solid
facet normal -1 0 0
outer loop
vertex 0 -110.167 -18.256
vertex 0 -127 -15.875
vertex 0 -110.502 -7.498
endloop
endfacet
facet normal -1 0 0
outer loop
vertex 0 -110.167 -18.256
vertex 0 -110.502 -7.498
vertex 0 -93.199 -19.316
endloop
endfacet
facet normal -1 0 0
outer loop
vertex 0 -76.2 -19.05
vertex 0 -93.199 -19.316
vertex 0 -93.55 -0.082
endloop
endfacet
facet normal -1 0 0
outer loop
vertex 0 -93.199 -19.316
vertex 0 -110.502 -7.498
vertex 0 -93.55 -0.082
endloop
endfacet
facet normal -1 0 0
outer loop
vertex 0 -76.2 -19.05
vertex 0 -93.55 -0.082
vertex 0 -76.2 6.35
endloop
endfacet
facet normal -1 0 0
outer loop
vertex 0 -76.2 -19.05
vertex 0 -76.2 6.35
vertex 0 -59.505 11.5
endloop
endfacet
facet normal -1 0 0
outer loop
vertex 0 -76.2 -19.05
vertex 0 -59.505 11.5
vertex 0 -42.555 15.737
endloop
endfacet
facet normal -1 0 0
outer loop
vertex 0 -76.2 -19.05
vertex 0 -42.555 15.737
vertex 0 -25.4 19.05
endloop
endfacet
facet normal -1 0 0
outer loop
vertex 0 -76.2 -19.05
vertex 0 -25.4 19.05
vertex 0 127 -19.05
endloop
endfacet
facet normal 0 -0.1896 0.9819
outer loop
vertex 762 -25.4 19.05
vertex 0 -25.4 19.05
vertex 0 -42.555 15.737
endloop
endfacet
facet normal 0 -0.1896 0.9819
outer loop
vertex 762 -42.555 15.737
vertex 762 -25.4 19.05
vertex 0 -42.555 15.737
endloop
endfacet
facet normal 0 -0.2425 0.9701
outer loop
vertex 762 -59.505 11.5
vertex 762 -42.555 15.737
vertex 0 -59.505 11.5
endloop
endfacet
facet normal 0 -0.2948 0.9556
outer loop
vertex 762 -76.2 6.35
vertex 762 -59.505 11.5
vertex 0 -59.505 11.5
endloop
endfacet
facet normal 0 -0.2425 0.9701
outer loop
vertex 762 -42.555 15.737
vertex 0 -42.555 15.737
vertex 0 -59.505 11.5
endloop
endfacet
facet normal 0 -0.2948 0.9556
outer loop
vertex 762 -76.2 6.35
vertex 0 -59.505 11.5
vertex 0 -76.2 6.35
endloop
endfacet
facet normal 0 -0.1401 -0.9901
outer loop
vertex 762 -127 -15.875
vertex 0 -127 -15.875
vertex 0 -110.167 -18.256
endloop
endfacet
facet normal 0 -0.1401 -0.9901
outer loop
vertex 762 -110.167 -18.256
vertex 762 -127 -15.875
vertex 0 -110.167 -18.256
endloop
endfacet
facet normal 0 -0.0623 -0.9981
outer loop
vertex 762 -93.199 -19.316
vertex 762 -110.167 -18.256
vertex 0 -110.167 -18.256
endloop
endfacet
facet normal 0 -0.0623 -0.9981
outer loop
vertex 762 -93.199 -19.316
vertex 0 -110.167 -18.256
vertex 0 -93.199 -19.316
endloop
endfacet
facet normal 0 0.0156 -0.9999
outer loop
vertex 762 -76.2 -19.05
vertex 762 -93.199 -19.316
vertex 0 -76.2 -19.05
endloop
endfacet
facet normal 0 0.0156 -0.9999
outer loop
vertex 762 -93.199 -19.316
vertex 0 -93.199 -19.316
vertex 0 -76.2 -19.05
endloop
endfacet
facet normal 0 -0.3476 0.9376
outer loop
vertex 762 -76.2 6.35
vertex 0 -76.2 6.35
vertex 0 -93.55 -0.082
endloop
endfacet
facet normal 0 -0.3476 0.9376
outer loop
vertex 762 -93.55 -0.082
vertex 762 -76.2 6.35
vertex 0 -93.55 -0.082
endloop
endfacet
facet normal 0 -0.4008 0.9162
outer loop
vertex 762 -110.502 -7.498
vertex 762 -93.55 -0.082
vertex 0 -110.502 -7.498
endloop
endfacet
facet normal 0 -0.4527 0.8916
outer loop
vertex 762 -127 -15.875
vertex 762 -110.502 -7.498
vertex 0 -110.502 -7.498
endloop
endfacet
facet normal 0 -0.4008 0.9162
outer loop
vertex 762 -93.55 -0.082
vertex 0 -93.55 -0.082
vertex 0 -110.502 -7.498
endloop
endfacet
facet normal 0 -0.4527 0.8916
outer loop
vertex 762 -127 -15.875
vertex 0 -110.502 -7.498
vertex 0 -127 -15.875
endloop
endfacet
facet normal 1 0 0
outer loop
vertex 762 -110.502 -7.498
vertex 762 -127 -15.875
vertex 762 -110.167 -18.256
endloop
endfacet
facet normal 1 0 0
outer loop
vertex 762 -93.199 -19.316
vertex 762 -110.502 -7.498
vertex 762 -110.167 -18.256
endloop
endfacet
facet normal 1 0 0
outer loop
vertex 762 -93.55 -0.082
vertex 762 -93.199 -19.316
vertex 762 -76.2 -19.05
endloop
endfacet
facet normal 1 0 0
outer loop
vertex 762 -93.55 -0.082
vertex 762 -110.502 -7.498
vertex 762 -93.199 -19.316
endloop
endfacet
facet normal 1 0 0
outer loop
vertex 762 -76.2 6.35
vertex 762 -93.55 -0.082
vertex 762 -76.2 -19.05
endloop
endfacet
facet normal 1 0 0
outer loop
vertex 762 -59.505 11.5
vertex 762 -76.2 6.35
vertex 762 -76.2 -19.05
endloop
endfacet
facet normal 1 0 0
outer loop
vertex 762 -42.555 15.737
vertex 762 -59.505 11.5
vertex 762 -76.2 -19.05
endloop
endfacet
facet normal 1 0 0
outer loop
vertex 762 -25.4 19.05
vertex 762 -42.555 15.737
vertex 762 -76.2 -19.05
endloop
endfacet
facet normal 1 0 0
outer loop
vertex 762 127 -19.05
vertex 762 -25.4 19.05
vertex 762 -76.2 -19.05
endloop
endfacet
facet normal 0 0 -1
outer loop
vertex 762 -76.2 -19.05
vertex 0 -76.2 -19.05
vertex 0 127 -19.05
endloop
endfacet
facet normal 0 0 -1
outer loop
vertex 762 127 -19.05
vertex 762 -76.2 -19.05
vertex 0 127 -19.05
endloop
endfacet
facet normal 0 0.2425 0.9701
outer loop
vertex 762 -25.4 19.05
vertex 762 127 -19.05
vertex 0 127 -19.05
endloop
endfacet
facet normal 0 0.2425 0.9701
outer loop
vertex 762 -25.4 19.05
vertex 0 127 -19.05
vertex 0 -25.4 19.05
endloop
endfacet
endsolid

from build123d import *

# Parameters (mm, degrees)
F1_DEPTH = 762


# Not quite as in the source:
# - a feature names something its author has since deleted; it is built from what else it names


with BuildPart() as f1:
    # F0 (on Right) → F1 (new body)
    with BuildSketch(Plane.YZ):
        with BuildLine():
            ThreePointArc((-76.2, 6.35), (-102.0787858137, -3.6681324257), (-127, -15.875))
            ThreePointArc((-127, -15.875), (-101.6930614476, -18.9514831615), (-76.2, -19.05))
            Line((-76.2, -19.05), (-76.2, -17.4625))
            Line((-76.2, -17.4625), (-76.2, 6.35))
        make_face()
        with BuildLine():
            Line((127, -19.05), (-25.4, 19.05))
            ThreePointArc((-25.4, 19.05), (-51.0583154566, 13.7332618264), (-76.2, 6.35))
            Line((-76.2, 6.35), (-76.2, -17.4625))
            Line((-76.2, -17.4625), (-76.2, -19.05))
            Line((-76.2, -19.05), (127, -19.05))
        make_face()
    extrude(amount=F1_DEPTH)


solid = f1.part
